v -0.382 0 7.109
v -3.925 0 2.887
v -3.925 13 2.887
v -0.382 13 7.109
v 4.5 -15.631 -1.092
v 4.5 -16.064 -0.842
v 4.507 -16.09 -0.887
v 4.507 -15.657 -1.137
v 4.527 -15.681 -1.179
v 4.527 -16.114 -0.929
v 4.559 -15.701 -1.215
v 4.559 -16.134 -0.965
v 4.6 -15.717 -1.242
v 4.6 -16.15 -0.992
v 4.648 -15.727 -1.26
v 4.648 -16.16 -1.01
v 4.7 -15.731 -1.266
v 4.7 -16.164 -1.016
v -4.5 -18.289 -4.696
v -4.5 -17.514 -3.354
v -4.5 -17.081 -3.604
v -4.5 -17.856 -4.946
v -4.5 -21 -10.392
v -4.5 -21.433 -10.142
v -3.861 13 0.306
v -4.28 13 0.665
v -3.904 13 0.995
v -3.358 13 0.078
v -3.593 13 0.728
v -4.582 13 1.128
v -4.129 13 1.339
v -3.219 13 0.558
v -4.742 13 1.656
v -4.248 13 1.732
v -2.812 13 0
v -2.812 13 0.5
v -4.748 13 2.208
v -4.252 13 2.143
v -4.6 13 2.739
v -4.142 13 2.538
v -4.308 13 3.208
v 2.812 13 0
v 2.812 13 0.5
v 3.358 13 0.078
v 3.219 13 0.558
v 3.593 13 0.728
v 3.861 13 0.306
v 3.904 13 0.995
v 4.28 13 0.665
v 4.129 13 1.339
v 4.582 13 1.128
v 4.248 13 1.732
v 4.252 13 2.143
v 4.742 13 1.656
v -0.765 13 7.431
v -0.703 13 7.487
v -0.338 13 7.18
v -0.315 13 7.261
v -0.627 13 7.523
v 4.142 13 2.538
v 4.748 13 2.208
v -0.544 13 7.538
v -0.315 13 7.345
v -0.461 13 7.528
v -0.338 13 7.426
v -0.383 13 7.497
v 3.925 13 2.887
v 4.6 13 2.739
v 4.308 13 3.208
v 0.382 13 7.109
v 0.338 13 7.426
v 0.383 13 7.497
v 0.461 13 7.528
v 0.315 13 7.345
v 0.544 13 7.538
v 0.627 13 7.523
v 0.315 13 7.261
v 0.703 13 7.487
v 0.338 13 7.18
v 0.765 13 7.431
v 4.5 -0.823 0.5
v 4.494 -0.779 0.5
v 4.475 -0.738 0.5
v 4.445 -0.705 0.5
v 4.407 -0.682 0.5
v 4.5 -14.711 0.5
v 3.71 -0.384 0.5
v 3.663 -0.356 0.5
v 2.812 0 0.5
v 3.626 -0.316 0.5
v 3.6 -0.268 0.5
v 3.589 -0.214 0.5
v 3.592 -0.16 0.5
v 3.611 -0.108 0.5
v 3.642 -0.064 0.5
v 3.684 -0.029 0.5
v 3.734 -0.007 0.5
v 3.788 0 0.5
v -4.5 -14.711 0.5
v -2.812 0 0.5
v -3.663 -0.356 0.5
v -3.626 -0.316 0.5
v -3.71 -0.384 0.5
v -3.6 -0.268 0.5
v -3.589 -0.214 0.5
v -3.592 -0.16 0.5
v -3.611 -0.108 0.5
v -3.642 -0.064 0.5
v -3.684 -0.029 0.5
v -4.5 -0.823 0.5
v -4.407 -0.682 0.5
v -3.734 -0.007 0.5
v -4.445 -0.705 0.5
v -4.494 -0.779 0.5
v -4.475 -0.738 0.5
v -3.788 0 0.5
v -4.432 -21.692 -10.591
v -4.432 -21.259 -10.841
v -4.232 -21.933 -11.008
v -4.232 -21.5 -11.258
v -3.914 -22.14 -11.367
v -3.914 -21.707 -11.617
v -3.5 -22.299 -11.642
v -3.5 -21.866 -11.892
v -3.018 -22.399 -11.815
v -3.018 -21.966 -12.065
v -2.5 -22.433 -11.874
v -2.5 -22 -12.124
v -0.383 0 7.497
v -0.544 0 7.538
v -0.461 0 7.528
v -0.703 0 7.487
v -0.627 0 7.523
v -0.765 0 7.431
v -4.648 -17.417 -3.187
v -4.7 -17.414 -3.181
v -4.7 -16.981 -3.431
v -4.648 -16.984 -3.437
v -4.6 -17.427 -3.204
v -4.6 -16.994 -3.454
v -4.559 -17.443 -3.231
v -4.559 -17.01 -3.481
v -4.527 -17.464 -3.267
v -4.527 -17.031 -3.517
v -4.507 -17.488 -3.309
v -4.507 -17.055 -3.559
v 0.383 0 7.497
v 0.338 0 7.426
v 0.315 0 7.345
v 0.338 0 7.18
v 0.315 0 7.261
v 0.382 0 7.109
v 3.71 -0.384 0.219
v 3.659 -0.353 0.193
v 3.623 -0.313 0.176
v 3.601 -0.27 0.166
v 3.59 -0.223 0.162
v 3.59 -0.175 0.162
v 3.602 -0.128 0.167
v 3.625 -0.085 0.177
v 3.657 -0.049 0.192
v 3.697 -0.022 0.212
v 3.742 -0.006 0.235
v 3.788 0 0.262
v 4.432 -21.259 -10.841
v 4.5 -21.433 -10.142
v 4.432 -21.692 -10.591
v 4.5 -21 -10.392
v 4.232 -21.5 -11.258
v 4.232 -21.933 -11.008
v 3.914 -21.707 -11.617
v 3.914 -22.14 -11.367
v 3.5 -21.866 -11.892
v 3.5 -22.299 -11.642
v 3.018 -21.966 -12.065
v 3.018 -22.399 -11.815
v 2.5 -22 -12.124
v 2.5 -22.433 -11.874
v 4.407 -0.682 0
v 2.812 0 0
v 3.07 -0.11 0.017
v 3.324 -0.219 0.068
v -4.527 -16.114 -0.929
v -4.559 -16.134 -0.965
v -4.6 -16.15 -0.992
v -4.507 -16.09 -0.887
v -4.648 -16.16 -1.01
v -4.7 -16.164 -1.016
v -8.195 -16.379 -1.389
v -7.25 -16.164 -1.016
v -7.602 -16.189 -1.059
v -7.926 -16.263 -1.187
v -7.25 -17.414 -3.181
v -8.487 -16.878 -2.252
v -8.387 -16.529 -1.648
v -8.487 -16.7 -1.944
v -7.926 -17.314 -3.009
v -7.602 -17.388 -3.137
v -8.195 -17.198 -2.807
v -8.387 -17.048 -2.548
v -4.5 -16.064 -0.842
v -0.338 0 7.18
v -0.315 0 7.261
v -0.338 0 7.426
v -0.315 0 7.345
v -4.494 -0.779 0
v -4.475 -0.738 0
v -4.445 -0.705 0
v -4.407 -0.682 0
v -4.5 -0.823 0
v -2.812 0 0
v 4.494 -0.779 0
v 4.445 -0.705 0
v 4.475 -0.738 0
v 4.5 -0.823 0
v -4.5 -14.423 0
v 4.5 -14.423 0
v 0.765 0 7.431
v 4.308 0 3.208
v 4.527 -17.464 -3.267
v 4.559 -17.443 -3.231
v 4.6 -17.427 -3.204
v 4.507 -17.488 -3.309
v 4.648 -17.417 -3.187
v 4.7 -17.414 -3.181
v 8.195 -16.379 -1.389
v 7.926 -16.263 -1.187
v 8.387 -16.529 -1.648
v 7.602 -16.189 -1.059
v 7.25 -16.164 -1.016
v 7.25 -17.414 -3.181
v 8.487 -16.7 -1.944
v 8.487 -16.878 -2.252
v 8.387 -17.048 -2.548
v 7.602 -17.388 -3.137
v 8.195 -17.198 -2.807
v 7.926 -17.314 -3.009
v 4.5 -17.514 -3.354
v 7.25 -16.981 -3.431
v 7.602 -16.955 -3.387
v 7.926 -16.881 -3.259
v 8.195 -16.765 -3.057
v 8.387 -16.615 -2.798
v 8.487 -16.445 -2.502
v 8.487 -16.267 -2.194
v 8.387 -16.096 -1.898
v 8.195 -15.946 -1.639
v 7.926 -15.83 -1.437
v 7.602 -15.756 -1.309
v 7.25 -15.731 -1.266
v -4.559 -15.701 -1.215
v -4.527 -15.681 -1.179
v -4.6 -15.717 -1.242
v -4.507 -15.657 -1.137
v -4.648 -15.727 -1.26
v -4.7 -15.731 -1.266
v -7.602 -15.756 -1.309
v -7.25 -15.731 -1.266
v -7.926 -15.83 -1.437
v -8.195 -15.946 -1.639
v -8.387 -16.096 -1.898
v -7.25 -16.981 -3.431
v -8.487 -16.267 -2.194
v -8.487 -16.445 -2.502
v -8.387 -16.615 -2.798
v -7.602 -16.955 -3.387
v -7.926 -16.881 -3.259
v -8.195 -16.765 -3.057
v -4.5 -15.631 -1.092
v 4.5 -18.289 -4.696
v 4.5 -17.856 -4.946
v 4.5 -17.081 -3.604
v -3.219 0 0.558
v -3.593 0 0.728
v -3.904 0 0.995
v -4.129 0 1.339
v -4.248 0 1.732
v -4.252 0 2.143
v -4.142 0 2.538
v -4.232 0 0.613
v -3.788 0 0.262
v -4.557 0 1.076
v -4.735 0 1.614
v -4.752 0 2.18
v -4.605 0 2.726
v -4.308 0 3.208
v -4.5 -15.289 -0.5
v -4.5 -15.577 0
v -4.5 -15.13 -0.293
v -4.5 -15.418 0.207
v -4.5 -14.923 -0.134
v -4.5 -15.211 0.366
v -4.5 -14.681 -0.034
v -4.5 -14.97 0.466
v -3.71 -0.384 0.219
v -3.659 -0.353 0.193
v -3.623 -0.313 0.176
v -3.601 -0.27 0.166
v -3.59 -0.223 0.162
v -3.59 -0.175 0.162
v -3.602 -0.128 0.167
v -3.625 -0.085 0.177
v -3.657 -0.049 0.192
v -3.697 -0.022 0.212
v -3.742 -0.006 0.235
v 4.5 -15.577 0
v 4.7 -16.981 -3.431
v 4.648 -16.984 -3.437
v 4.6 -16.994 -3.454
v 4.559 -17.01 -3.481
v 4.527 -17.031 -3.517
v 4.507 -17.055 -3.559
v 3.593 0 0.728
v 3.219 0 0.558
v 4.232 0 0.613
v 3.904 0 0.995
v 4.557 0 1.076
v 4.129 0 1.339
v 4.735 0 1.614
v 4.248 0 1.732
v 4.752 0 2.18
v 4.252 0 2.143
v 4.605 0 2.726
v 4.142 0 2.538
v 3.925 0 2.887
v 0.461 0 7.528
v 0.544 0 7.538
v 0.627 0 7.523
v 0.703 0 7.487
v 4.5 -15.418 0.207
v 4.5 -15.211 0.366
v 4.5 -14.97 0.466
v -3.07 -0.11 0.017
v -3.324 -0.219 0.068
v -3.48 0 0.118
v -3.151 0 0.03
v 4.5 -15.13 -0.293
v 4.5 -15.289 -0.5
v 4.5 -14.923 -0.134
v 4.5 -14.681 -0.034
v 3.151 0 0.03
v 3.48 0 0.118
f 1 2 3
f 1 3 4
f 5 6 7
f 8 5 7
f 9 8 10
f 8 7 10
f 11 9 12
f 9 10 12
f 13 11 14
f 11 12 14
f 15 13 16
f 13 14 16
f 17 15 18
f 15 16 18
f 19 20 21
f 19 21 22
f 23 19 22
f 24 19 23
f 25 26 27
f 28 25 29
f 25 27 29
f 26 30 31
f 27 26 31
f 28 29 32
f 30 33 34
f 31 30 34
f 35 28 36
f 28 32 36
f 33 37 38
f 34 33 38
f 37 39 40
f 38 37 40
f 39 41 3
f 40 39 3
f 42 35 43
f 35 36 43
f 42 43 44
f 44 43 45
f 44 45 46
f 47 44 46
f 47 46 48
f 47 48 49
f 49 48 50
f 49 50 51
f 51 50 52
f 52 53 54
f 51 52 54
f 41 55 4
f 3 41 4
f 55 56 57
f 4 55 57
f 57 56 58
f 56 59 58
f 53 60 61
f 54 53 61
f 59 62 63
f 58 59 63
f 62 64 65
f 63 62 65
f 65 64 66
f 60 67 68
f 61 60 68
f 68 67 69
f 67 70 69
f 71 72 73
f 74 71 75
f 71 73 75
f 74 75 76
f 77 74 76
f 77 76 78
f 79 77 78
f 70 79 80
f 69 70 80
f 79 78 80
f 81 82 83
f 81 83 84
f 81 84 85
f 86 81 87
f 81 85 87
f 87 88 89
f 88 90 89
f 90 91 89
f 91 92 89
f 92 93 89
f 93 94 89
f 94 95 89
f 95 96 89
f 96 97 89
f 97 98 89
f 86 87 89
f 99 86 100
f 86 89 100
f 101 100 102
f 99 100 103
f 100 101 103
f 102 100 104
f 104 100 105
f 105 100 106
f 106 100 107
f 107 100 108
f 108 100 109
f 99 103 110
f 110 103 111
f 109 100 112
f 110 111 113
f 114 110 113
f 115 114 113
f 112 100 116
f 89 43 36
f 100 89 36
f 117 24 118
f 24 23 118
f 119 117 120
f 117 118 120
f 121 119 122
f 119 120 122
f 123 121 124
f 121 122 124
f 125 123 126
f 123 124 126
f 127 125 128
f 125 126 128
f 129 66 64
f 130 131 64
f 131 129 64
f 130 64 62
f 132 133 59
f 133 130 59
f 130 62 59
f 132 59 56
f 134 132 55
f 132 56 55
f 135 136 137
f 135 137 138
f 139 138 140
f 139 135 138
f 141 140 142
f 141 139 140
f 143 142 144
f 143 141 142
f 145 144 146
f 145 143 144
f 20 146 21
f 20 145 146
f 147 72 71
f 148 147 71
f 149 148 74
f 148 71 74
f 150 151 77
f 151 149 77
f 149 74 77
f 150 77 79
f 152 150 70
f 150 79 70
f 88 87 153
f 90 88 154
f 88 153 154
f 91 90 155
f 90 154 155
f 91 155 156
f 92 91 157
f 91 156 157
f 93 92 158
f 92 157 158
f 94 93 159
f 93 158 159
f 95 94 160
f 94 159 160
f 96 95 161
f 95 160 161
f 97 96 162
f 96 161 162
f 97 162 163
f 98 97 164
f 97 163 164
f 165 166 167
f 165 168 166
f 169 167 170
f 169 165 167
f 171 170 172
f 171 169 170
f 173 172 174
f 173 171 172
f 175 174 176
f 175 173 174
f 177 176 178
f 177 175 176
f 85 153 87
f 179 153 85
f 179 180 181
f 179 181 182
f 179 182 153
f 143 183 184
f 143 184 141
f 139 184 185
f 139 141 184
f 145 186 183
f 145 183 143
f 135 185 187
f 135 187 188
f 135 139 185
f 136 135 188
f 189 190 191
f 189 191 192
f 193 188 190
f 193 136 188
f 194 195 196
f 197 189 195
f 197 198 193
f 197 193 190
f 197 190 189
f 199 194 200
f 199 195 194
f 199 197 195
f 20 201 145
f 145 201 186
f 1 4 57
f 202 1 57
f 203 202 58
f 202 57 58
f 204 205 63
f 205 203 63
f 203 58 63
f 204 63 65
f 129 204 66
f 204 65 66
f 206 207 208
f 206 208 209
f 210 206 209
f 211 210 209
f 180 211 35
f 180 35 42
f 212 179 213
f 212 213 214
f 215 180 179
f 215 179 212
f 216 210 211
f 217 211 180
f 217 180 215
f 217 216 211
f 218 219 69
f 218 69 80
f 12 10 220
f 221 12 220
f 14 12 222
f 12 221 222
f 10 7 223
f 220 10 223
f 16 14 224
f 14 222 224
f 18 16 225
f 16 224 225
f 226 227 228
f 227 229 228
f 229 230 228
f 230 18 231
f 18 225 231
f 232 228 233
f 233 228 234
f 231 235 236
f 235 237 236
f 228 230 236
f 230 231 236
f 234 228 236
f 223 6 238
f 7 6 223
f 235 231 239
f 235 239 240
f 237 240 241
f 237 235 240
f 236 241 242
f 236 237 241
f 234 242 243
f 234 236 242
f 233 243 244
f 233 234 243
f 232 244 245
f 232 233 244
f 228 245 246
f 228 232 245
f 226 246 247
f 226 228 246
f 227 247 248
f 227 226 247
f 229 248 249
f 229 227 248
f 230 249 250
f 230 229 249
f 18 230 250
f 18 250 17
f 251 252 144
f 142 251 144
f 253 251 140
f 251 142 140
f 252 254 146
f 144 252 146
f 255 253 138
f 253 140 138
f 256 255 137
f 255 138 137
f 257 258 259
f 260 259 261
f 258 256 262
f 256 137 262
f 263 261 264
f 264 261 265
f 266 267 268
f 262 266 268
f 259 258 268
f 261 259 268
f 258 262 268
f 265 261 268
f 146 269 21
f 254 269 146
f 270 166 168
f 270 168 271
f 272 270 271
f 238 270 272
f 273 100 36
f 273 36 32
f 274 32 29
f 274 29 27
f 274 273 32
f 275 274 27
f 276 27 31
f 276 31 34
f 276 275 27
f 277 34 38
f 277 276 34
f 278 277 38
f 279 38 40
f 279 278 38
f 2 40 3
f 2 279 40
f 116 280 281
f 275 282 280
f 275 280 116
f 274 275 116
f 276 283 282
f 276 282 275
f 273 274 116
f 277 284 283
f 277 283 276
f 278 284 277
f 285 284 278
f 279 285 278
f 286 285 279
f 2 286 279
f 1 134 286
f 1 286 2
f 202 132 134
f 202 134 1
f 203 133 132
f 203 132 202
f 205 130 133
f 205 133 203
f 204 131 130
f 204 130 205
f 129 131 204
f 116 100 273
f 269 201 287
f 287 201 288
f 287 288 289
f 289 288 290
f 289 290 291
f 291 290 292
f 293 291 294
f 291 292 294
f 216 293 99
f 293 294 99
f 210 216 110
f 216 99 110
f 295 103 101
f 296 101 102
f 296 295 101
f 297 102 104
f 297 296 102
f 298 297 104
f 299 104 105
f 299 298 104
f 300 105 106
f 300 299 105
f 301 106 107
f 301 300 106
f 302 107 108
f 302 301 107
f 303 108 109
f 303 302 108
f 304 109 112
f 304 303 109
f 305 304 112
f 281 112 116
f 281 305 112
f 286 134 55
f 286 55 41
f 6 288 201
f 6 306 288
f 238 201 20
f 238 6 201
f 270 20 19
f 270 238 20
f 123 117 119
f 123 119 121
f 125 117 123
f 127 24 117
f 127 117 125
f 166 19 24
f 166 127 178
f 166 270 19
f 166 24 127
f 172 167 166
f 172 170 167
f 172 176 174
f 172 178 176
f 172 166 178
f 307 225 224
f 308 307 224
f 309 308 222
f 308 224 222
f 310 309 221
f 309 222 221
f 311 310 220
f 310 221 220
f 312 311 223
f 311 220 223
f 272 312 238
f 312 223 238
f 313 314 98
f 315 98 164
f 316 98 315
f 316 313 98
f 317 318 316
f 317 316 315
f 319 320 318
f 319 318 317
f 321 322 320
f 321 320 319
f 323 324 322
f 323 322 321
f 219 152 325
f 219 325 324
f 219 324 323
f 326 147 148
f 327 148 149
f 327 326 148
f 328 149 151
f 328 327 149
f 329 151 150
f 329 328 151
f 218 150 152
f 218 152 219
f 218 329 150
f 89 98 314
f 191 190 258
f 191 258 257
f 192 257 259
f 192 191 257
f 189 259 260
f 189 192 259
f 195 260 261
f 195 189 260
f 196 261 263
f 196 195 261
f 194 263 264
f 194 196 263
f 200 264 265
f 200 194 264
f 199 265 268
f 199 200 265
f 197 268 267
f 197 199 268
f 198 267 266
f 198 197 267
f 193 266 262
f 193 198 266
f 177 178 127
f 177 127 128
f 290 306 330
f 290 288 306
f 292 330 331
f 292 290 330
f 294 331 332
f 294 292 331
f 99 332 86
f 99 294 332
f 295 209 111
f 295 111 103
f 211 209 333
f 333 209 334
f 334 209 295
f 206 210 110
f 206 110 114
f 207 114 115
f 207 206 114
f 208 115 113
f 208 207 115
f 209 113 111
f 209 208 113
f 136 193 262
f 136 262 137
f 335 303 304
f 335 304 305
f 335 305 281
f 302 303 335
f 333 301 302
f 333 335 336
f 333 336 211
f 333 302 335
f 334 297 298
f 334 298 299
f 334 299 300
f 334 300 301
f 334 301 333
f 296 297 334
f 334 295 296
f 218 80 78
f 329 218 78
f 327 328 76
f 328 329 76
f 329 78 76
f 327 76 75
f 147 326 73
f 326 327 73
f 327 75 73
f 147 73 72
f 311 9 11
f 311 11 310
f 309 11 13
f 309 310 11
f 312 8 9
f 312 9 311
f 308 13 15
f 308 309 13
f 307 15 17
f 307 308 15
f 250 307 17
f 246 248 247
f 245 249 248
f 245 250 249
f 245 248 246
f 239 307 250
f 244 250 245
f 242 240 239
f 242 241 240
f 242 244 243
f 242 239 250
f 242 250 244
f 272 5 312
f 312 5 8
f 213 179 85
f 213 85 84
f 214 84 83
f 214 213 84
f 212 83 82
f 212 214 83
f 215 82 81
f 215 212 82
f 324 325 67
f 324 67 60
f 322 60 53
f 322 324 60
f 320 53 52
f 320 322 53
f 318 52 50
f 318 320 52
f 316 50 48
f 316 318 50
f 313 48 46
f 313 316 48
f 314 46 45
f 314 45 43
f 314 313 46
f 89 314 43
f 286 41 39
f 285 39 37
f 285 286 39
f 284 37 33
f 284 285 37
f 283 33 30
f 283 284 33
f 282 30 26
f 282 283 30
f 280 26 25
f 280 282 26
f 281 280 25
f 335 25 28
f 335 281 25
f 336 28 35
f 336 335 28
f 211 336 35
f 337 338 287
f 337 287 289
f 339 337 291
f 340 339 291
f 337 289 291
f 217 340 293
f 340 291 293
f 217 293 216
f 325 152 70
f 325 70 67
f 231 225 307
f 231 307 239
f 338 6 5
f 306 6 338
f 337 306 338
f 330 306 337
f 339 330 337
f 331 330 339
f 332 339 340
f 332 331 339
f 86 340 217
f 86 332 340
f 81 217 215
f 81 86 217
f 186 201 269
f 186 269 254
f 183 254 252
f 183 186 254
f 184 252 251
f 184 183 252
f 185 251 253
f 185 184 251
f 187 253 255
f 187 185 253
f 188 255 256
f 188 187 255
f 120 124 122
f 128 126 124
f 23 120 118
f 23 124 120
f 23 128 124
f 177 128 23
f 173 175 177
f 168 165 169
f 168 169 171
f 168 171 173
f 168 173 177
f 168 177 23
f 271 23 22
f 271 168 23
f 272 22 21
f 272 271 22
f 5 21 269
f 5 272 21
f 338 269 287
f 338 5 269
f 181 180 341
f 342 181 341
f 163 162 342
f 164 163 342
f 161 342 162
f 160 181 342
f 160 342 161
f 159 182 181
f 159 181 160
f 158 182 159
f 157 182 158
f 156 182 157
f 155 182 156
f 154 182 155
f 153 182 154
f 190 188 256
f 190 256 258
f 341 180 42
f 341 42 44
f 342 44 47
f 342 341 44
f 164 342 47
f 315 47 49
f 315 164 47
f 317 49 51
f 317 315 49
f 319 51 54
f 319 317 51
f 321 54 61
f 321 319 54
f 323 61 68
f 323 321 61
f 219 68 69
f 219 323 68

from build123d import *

# Parameters (mm, degrees)
F1_DEPTH      = 13
F3_W          = 5.624003956
F3_H          = 13
F4_DEPTH      = 0.5
F6_DEPTH      = 9
F8_W          = 1.375
F8_H          = 2.5
F9_DEPTH      = 0.5
F10_R         = 2
F11_R         = 1
F12_T1_DEPTH  = 14.5
F13_T1_DEPTH  = 0.5
F13_T6_DEPTH  = 0.5
F13_S7_R      = 1.95289555
F13_T8_DEPTH  = 2
F13_T12_DEPTH = 0.5
F13_S13_R     = 1.95289555
F13_T14_DEPTH = 2


# Not quite as in the source:
# - a fillet or chamfer that OpenCascade refuses, or shapes differently, is made with other operations: its cross-section is extruded or revolved along the edge and cut away or added


with BuildPart() as f1:
    # F0 (on Front) → F1 (new body)
    with BuildSketch(Plane.XZ):
        with BuildLine():
            Line((-0.1891016816, 7.3390506263), (-0.5721239031, 7.6604444312))
            Line((-0.5721239031, 7.6604444312), (-4.3080067621, 3.2081926126))
            ThreePointArc((-4.3080067621, 3.2081926126), (-4.5819264222, 1.1275662273), (-2.812001978, 0))
            Line((-2.812001978, 0), (0, 0))
            Line((0, 0), (0, 0.5))
            Line((0, 0.5), (-2.812001978, 0.5))
            ThreePointArc((-2.812001978, 0.5), (-4.1287725287, 1.3388753582), (-3.9249845405, 2.8867988077))
            Line((-3.9249845405, 2.8867988077), (-0.1891016816, 7.3390506263))
        make_face()
        with BuildLine():
            Line((0, 0.5), (0, 0))
            Line((0, 0), (2.812001978, 0))
            ThreePointArc((2.812001978, 0), (4.5819264222, 1.1275662273), (4.3080067621, 3.2081926126))
            Line((4.3080067621, 3.2081926126), (0.5721239031, 7.6604444312))
            Line((0.5721239031, 7.6604444312), (0.1891016816, 7.3390506263))
            Line((0.1891016816, 7.3390506263), (3.9249845405, 2.8867988077))
            ThreePointArc((3.9249845405, 2.8867988077), (4.1287725287, 1.3388753582), (2.812001978, 0.5))
            Line((2.812001978, 0.5), (0, 0.5))
        make_face()
    extrude(amount=-F1_DEPTH)

    # F3 (on offset) → F4 (join, through all)
    with BuildSketch(Plane(origin=(0, 0, 0), x_dir=(1, 0, 0), z_dir=(0, 0, -1))):
        with Locations((0, -6.5)):
            Rectangle(F3_W, F3_H)
        with BuildLine():
            Line((-2.812001978, 0), (2.812001978, 0))
            Line((2.812001978, 0), (4.4072171914, 0.6821090398))
            ThreePointArc((4.4072171914, 0.6821090398), (4.4747132661, 0.7384715991), (4.5, 0.8226917824))
            Line((4.5, 0.8226917824), (4.5, 15))
            Line((4.5, 15), (-4.5, 15))
            Line((-4.5, 15), (-4.5, 0.8226917824))
            ThreePointArc((-4.5, 0.8226917824), (-4.4747132661, 0.7384715991), (-4.4072171914, 0.6821090398))
            Line((-4.4072171914, 0.6821090398), (-2.812001978, 0))
        make_face()
    extrude(amount=-F4_DEPTH)

    # F5 (on face) → F6 (join, through all)
    with BuildSketch(Plane.YZ.offset(4.5)):
        Polygon((-22.4330127019, -11.874355653), (-22, -12.124355653), (-15, 0), (-15, 0.5), (-15.2886751346, 0.5), align=None)
    extrude(amount=-F6_DEPTH)

    # F8 (on offset) → F9 (join, through all)
    with BuildSketch(Plane(origin=(0, -11.6830127019, 6.7451905284), x_dir=(1, 0, 0), z_dir=(0, -0.8660254038, 0.5))):
        with Locations((-5.1875, -10.2113248654)):
            Rectangle(F8_W, F8_H)
        with BuildLine():
            Line((-5.875, -11.4613248654), (-5.875, -8.9613248654))
            Line((-5.875, -8.9613248654), (-7.25, -8.9613248654))
            ThreePointArc((-7.25, -8.9613248654), (-8.5, -10.2113248654), (-7.25, -11.4613248654))
            Line((-7.25, -11.4613248654), (-5.875, -11.4613248654))
        make_face()
        Polygon((4.5, -7.2113248654), (-4.5, -7.2113248654), (-4.5, -8.9613248654), (-4.5, -11.4613248654), (-4.5, -13.2113248654), (4.5, -13.2113248654), (4.5, -11.4613248654), (5.875, -11.4613248654), (5.875, -8.9613248654), (4.5, -8.9613248654), align=None)
        with BuildLine():
            Line((7.25, -8.9613248654), (5.875, -8.9613248654))
            Line((5.875, -8.9613248654), (5.875, -11.4613248654))
            Line((5.875, -11.4613248654), (7.25, -11.4613248654))
            ThreePointArc((7.25, -11.4613248654), (8.5, -10.2113248654), (7.25, -8.9613248654))
        make_face()
    extrude(amount=-F9_DEPTH)

    # F10
    f10_edges = [f1.edges().sort_by_distance(p)[0] for p in [
        (4.5, -22.216506, -11.999356),
        (-4.5, -22.216506, -11.999356),
    ]]
    fillet(f10_edges, radius=F10_R)

    # F11
    f11_edges = [f1.edges().sort_by_distance(p)[0] for p in [
        (0, -15.288675, 0.5),
        (0, -15, 0),
    ]]
    fillet(f11_edges, radius=F11_R)

    # F12: fillet of radius 0.3 on 4 edges, made by hand

    # F12_s2 → F12_t1 (cut)
    with BuildSketch(Plane.XZ.offset(-13.75)):
        with BuildLine():
            ThreePointArc((0.4189150145, 7.5318869093), (0.312892888, 7.3282202991), (0.3819379645, 7.1092372934))
            Line((0.3819379645, 7.1092372934), (0.1891016816, 7.3390506263))
            Line((0.1891016816, 7.3390506263), (0.4189150145, 7.5318869093))
        make_face()
        with BuildLine():
            ThreePointArc((-0.3819379645, 7.1092372934), (-0.312892888, 7.3282202991), (-0.4189150145, 7.5318869093))
            Line((-0.4189150145, 7.5318869093), (-0.1891016816, 7.3390506263))
            Line((-0.1891016816, 7.3390506263), (-0.3819379645, 7.1092372934))
        make_face()
        with BuildLine():
            ThreePointArc((0.764960186, 7.4306310983), (0.5612935759, 7.5366532248), (0.3423105702, 7.4676081483))
            Line((0.3423105702, 7.4676081483), (0.5721239031, 7.6604444312))
            Line((0.5721239031, 7.6604444312), (0.764960186, 7.4306310983))
        make_face()
        with BuildLine():
            ThreePointArc((-0.3423105702, 7.4676081483), (-0.5612935759, 7.5366532248), (-0.764960186, 7.4306310983))
            Line((-0.764960186, 7.4306310983), (-0.5721239031, 7.6604444312))
            Line((-0.5721239031, 7.6604444312), (-0.3423105702, 7.4676081483))
        make_face()
    extrude(amount=F12_T1_DEPTH, mode=Mode.SUBTRACT)

    # F13: fillet of radius 0.2 on 6 edges, made by hand

    # F13_s2 → F13_t1 (join)
    with BuildSketch(Plane(origin=(0, -11.6830127019, 6.7451905284), x_dir=(1, 0, 0), z_dir=(0, 0.8660254038, -0.5))):
        with BuildLine():
            ThreePointArc((-4.5, 8.7613248654), (-4.5585786438, 8.9027462216), (-4.7, 8.9613248654))
            Line((-4.7, 8.9613248654), (-4.5, 8.9613248654))
            Line((-4.5, 8.9613248654), (-4.5, 8.7613248654))
        make_face()
        with BuildLine():
            ThreePointArc((-4.7, 11.4613248654), (-4.5585786438, 11.5199035092), (-4.5, 11.6613248654))
            Line((-4.5, 11.6613248654), (-4.5, 11.4613248654))
            Line((-4.5, 11.4613248654), (-4.7, 11.4613248654))
        make_face()
        with BuildLine():
            ThreePointArc((4.5, 8.7613248654), (4.5585786438, 8.9027462216), (4.7, 8.9613248654))
            Line((4.7, 8.9613248654), (4.5, 8.9613248654))
            Line((4.5, 8.9613248654), (4.5, 8.7613248654))
        make_face()
        with BuildLine():
            ThreePointArc((4.7, 11.4613248654), (4.5585786438, 11.5199035092), (4.5, 11.6613248654))
            Line((4.5, 11.6613248654), (4.5, 11.4613248654))
            Line((4.5, 11.4613248654), (4.7, 11.4613248654))
        make_face()
    extrude(amount=F13_T1_DEPTH)


with BuildPart() as f13_tool4:
    # F13_s5 → F13_t6 (new body)
    with BuildSketch(Plane.XY):
        with BuildLine():
            ThreePointArc((3.7097957982, -0.3838938316), (3.5924961377, -0.159867509), (3.7884282258, 0))
            Line((3.7884282258, 0), (2.812001978, 0))
            Line((2.812001978, 0), (3.7097957982, -0.3838938316))
        make_face()
    extrude(amount=F13_T6_DEPTH)

    # F13_s7 → F13_t8 (intersect, symmetric)
    with BuildSketch(Plane.XZ.offset(0.2)):
        with Locations((2.812001978, 1.95289555)):
            Circle(F13_S7_R)
    extrude(amount=F13_T8_DEPTH, both=True, mode=Mode.INTERSECT)


with BuildPart() as f1_1:
    add(f1.part)

    # F13_t3: union F13_tool4
    add(f13_tool4.part)


with BuildPart() as f13_tool10:
    # F13_s11 → F13_t12 (new body)
    with BuildSketch(Plane.XY):
        with BuildLine():
            ThreePointArc((-3.7097957982, -0.3838938316), (-3.5924961377, -0.159867509), (-3.7884282258, 0))
            Line((-3.7884282258, 0), (-2.812001978, 0))
            Line((-2.812001978, 0), (-3.7097957982, -0.3838938316))
        make_face()
    extrude(amount=F13_T12_DEPTH)

    # F13_s13 → F13_t14 (intersect, symmetric)
    with BuildSketch(Plane.XZ.offset(0.2)):
        with Locations((-2.812001978, 1.95289555)):
            Circle(F13_S13_R)
    extrude(amount=F13_T14_DEPTH, both=True, mode=Mode.INTERSECT)


with BuildPart() as f1_2:
    add(f1_1.part)

    # F13_t9: union F13_tool10
    add(f13_tool10.part)


solid = f1_2.part
